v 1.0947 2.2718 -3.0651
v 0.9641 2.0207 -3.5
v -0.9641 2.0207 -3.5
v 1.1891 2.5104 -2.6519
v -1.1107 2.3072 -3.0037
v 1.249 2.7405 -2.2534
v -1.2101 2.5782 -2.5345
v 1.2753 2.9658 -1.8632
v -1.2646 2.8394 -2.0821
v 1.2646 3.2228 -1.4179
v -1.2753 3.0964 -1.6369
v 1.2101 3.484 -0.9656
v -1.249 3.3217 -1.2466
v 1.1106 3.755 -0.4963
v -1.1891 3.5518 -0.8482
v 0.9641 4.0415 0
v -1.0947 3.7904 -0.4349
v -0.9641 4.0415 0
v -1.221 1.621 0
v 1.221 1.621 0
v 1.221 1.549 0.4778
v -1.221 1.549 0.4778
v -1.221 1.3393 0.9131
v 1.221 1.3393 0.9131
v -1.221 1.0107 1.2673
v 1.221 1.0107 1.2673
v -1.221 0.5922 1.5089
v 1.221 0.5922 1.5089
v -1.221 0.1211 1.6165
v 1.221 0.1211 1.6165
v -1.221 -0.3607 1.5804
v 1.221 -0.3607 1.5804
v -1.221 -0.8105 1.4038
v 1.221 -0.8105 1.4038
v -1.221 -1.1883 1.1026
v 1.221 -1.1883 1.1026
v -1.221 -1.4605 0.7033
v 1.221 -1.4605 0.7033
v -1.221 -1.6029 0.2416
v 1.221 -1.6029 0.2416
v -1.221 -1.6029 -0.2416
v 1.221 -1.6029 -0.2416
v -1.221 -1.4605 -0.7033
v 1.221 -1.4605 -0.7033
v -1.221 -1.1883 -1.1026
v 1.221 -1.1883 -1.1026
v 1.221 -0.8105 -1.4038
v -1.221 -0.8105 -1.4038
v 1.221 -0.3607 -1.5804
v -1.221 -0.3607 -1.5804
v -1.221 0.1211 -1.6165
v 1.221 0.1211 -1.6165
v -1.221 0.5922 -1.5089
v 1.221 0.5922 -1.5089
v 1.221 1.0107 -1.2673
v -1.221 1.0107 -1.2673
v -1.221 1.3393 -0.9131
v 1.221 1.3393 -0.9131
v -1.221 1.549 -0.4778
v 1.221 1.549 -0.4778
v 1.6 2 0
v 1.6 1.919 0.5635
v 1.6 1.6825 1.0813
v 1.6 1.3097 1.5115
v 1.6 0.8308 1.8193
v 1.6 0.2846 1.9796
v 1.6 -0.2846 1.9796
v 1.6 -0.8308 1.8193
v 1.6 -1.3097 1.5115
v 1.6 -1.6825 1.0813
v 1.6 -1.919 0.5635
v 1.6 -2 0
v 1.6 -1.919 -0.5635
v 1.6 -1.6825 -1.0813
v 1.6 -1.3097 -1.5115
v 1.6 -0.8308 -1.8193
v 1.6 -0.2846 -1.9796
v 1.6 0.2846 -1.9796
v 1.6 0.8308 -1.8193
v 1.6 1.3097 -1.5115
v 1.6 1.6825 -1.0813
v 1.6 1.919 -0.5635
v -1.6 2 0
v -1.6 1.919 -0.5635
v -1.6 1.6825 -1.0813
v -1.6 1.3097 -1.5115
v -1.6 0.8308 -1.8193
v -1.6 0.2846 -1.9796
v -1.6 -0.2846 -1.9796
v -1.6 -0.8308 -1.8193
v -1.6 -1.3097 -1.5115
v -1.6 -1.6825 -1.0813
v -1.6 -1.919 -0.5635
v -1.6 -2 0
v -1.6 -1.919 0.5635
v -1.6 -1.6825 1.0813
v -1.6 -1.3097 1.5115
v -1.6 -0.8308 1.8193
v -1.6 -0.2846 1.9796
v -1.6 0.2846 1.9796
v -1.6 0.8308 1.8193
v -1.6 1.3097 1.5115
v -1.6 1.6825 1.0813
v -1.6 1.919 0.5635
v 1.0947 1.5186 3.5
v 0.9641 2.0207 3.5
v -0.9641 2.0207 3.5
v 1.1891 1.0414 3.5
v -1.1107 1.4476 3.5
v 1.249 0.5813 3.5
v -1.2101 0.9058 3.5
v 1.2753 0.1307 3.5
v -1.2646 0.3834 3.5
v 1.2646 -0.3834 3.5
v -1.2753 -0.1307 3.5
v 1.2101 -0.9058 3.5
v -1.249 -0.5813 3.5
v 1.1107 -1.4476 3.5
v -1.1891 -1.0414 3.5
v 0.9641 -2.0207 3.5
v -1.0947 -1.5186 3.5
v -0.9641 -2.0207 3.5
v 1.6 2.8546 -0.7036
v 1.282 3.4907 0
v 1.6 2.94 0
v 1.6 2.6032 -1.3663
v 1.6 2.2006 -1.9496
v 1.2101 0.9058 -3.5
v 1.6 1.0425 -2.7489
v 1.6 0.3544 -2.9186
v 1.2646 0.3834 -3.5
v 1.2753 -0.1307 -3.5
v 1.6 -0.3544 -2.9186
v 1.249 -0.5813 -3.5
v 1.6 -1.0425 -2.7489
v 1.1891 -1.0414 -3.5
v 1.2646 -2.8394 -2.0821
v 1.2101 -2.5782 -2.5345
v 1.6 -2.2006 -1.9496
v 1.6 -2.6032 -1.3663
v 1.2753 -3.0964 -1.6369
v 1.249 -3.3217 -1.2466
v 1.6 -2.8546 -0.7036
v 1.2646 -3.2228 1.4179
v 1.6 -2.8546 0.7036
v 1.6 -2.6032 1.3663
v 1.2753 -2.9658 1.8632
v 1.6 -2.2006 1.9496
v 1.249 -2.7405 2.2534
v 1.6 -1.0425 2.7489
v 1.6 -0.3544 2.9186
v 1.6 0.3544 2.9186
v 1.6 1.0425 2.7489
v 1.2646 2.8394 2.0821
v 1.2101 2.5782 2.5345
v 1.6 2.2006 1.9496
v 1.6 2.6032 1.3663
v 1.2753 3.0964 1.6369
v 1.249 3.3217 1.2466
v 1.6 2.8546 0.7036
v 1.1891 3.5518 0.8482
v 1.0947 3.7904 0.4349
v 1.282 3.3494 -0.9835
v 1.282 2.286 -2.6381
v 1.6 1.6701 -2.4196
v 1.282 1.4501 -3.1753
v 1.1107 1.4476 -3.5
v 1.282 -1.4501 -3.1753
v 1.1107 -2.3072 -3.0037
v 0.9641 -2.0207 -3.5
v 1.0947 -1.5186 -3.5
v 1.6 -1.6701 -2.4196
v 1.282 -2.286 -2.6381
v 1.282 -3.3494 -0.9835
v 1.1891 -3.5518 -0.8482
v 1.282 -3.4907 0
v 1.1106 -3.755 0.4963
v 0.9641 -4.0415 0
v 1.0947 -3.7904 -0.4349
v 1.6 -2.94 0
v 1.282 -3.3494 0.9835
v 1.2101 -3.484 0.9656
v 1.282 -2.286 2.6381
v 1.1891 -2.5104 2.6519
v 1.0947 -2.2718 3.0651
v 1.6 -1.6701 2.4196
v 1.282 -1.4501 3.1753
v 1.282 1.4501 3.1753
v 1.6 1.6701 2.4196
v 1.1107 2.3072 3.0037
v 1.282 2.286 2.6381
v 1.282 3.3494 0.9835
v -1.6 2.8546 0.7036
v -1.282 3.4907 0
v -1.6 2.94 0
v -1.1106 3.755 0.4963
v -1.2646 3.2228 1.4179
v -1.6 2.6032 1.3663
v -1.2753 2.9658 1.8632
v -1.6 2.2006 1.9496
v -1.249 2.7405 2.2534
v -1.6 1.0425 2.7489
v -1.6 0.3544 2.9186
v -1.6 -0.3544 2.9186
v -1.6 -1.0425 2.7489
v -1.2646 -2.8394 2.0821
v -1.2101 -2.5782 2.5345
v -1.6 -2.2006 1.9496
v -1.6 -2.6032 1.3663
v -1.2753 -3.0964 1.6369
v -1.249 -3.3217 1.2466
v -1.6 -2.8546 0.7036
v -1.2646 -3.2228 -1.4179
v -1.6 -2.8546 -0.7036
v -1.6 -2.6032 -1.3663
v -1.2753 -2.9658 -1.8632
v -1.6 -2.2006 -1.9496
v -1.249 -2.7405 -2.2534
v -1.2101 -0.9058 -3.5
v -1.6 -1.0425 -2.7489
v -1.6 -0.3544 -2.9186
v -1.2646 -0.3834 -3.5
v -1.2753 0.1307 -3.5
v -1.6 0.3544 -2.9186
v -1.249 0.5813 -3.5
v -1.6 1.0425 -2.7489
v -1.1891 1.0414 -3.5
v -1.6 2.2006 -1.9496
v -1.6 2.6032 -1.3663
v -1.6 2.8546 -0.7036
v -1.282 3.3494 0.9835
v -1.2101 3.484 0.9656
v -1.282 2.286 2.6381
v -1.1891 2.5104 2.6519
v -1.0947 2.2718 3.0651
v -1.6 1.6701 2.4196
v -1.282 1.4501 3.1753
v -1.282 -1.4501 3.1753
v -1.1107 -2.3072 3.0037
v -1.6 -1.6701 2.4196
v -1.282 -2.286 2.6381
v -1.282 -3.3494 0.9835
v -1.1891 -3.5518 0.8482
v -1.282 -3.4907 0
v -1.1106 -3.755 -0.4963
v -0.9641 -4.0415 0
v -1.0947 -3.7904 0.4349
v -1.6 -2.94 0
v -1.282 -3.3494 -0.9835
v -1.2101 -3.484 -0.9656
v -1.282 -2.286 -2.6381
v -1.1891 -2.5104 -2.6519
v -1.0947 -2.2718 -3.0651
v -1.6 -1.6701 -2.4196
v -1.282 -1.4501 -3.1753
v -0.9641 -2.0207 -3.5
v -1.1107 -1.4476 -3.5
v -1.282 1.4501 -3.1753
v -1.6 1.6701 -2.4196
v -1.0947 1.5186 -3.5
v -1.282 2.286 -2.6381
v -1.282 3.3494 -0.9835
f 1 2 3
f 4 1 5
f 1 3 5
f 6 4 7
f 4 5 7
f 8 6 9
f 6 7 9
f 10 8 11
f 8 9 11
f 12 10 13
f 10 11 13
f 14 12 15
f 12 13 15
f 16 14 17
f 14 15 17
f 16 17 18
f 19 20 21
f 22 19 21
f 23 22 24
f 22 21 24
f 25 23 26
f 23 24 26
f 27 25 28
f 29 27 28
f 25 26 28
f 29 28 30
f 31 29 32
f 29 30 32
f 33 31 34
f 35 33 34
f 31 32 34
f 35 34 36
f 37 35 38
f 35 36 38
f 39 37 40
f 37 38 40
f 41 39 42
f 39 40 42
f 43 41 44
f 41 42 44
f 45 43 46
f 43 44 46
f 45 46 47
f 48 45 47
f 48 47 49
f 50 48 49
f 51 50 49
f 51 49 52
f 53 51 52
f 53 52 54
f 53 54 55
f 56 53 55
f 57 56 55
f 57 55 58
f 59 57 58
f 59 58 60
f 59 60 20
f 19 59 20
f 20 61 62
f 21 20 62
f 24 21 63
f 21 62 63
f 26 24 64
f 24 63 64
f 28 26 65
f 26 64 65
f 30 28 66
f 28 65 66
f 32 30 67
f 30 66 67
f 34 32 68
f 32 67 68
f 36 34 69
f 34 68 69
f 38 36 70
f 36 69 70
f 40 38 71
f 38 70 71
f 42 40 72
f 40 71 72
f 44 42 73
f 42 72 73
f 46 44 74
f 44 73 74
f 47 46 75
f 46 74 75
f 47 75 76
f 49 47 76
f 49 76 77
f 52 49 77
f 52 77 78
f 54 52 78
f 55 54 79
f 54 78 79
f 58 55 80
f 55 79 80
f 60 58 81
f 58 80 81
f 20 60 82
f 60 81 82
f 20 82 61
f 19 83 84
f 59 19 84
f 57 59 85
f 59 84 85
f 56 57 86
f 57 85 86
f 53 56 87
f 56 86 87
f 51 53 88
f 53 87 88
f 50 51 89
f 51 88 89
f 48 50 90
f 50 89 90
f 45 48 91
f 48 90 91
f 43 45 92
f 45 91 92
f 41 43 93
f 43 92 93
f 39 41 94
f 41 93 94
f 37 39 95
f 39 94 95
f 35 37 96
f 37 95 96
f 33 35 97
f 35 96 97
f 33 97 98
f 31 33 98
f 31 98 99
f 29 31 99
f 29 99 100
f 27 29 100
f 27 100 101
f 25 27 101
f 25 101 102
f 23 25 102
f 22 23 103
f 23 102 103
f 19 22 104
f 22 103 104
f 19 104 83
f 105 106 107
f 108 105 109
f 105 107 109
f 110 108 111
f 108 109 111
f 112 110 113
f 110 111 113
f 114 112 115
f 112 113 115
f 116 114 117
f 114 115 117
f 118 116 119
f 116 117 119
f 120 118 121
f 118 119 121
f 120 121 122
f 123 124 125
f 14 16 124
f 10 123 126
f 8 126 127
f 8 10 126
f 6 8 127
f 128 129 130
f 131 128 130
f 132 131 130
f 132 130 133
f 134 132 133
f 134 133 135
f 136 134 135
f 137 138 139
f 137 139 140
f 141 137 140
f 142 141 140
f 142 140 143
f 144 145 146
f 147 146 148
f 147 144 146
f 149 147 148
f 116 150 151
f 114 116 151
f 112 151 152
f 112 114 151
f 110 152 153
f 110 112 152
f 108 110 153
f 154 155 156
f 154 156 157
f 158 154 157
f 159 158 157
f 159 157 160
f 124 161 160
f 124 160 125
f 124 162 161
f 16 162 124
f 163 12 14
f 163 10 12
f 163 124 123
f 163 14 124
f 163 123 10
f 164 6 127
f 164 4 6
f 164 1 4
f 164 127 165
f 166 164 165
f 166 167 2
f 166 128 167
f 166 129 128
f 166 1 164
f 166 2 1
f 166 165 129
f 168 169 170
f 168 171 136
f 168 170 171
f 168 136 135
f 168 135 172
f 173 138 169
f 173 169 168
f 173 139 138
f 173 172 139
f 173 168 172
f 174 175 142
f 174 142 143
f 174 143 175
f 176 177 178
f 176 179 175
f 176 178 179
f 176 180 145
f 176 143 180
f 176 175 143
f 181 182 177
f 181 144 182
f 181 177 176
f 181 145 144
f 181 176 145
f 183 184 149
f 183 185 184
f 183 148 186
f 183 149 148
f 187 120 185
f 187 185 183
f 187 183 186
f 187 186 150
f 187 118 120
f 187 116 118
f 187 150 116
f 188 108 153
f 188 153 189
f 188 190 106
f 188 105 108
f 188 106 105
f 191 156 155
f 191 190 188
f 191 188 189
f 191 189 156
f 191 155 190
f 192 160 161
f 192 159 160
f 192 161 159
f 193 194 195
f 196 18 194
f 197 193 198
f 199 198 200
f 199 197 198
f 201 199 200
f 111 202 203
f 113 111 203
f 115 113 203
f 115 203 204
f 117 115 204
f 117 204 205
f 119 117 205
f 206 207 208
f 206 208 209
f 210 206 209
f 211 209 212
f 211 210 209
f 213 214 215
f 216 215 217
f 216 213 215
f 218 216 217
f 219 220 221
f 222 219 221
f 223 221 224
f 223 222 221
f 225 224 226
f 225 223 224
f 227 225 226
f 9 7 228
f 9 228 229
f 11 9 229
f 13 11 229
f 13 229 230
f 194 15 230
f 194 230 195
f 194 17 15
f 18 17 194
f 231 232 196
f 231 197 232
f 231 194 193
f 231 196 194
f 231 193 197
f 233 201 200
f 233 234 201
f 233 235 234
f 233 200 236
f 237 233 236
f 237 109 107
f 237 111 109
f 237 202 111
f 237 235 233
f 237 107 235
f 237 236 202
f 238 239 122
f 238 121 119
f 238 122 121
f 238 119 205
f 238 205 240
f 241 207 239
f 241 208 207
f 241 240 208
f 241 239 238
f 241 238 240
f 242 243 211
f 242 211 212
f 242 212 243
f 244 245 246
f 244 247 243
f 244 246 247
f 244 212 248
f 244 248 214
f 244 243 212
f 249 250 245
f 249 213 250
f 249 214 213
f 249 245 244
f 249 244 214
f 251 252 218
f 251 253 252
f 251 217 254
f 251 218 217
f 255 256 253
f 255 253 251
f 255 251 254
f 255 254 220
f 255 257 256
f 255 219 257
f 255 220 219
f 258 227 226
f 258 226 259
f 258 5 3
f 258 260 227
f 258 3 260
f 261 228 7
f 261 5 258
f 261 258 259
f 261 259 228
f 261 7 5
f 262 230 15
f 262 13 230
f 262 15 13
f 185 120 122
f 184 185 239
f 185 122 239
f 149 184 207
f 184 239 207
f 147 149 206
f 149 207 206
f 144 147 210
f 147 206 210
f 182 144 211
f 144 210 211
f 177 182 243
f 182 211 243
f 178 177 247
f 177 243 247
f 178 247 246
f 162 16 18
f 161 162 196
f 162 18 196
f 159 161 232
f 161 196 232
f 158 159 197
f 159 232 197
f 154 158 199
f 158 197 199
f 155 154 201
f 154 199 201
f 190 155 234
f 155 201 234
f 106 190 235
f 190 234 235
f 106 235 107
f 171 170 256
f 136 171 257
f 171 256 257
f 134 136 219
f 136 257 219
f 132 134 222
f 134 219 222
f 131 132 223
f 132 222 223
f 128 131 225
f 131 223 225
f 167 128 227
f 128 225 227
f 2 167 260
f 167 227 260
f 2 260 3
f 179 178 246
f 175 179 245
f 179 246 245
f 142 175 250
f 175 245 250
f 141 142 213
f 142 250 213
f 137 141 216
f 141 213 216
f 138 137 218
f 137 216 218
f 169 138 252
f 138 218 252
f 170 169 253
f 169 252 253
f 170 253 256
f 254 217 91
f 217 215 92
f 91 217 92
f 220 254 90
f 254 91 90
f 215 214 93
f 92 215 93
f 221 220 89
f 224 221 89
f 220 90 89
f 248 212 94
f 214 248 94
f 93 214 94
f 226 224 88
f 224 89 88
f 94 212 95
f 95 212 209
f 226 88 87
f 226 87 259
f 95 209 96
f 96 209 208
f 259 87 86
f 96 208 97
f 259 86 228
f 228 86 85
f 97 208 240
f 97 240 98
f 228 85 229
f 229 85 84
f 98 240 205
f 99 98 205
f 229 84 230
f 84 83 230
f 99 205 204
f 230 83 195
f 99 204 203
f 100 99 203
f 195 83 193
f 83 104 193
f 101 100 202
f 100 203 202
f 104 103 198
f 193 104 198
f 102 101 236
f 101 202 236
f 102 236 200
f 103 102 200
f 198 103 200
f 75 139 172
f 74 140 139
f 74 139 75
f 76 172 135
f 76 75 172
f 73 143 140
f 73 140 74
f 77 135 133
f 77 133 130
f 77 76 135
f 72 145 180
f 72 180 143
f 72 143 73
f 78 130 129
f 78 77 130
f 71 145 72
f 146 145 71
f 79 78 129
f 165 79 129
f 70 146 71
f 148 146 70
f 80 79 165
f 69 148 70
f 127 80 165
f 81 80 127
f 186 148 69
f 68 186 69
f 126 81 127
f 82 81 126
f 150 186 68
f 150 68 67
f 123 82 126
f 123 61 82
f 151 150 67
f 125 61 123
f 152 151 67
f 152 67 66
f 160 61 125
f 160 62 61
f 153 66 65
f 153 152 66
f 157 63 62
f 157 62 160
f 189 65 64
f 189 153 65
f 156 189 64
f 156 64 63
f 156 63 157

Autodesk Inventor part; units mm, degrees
sketch "B" plane through (0, 0, 0) normal (1, 0, 0) x (0, 1, 0)
  line L0 (-2.0207, 3.5) -> (-4.0415, 0)
  line L1 (-4.0415, 0) -> (-2.0207, -3.5)
  line L2 (-2.0207, -3.5) -> (2.0207, -3.5)
  line L3 (2.0207, -3.5) -> (4.0415, 0)
  line L4 (4.0415, 0) -> (2.0207, 3.5)
  line L5 (2.0207, 3.5) -> (-2.0207, 3.5)
extrude "Extrusion1" add sketch "B" along normal mid plane 3.2
sketch "Sketch_2" plane through (0, 0, 0) normal (0, 0, 1) x (1, 0, 0)
  line L0 (1.6, 0) -> (-1.6, 0)
  line L1 (-1.6, 0) -> (-1.6, 2)
  line L2 (-1.6, 2) -> (-1.221, 1.621)
  line L3 (-1.221, 1.621) -> (1.221, 1.621)
  line L4 (1.221, 1.621) -> (1.6, 2)
  line L5 (1.6, 2) -> (1.6, 0)
  line L6 (1.6, 0) -> (-1.6, 0)
revolve "Revolution1" cut sketch "Sketch_2" angle 360 about axis through (1.6, 0, 0) along (1, 0, 0)
thread "Thread1" size "M4x0.7" class "6H" standard "ISO Metric profile" full length
sketch "Sketch_3" plane through (0, 0, 0) normal (0, 0, 1) x (1, 0, 0)
  line L0 (50, 0) -> (-50, 0)
  line L1 (-6.6, 6.94) -> (-6.6, 1)
  line L2 (-6.6, 1) -> (-1.6, 1)
  line L3 (-1.6, 1) -> (-1.6, 2.94)
  line L4 (-1.6, 2.94) -> (0, 5.7113)
  line L5 (0, 5.7113) -> (1.6, 2.94)
  line L6 (1.6, 2.94) -> (1.6, 1)
  line L7 (1.6, 1) -> (6.6, 1)
  line L8 (6.6, 1) -> (6.6, 6.94)
  line L9 (6.6, 6.94) -> (-6.6, 6.94)
revolve "Revolution2" cut sketch "Sketch_3" angle 360 about axis through (50, 0, 0) along (1, 0, 0)
ref_plane "nt_XY" through (0, 0, 0) normal (1, 0, 0) x (0, 0, -1)
ref_plane "nt_YZ" through (0, 0, 0) normal (0, 0, -1) x (0, 1, 0)
ref_plane "nt_ZX" through (0, 0, 0) normal (0, 1, 0) x (1, 0, 0)
ref_plane "ntj_XY" through (1.6, 0, 0) normal (1, 0, 0) x (0, 0, -1)
ref_plane "ntj_YZ" through (1.6, 0, 0) normal (0, 0, -1) x (0, 1, 0)
ref_plane "ntj_ZX" through (1.6, 0, 0) normal (0, 1, 0) x (1, 0, 0)
properties part number "NTJ-010A_CJ2"
